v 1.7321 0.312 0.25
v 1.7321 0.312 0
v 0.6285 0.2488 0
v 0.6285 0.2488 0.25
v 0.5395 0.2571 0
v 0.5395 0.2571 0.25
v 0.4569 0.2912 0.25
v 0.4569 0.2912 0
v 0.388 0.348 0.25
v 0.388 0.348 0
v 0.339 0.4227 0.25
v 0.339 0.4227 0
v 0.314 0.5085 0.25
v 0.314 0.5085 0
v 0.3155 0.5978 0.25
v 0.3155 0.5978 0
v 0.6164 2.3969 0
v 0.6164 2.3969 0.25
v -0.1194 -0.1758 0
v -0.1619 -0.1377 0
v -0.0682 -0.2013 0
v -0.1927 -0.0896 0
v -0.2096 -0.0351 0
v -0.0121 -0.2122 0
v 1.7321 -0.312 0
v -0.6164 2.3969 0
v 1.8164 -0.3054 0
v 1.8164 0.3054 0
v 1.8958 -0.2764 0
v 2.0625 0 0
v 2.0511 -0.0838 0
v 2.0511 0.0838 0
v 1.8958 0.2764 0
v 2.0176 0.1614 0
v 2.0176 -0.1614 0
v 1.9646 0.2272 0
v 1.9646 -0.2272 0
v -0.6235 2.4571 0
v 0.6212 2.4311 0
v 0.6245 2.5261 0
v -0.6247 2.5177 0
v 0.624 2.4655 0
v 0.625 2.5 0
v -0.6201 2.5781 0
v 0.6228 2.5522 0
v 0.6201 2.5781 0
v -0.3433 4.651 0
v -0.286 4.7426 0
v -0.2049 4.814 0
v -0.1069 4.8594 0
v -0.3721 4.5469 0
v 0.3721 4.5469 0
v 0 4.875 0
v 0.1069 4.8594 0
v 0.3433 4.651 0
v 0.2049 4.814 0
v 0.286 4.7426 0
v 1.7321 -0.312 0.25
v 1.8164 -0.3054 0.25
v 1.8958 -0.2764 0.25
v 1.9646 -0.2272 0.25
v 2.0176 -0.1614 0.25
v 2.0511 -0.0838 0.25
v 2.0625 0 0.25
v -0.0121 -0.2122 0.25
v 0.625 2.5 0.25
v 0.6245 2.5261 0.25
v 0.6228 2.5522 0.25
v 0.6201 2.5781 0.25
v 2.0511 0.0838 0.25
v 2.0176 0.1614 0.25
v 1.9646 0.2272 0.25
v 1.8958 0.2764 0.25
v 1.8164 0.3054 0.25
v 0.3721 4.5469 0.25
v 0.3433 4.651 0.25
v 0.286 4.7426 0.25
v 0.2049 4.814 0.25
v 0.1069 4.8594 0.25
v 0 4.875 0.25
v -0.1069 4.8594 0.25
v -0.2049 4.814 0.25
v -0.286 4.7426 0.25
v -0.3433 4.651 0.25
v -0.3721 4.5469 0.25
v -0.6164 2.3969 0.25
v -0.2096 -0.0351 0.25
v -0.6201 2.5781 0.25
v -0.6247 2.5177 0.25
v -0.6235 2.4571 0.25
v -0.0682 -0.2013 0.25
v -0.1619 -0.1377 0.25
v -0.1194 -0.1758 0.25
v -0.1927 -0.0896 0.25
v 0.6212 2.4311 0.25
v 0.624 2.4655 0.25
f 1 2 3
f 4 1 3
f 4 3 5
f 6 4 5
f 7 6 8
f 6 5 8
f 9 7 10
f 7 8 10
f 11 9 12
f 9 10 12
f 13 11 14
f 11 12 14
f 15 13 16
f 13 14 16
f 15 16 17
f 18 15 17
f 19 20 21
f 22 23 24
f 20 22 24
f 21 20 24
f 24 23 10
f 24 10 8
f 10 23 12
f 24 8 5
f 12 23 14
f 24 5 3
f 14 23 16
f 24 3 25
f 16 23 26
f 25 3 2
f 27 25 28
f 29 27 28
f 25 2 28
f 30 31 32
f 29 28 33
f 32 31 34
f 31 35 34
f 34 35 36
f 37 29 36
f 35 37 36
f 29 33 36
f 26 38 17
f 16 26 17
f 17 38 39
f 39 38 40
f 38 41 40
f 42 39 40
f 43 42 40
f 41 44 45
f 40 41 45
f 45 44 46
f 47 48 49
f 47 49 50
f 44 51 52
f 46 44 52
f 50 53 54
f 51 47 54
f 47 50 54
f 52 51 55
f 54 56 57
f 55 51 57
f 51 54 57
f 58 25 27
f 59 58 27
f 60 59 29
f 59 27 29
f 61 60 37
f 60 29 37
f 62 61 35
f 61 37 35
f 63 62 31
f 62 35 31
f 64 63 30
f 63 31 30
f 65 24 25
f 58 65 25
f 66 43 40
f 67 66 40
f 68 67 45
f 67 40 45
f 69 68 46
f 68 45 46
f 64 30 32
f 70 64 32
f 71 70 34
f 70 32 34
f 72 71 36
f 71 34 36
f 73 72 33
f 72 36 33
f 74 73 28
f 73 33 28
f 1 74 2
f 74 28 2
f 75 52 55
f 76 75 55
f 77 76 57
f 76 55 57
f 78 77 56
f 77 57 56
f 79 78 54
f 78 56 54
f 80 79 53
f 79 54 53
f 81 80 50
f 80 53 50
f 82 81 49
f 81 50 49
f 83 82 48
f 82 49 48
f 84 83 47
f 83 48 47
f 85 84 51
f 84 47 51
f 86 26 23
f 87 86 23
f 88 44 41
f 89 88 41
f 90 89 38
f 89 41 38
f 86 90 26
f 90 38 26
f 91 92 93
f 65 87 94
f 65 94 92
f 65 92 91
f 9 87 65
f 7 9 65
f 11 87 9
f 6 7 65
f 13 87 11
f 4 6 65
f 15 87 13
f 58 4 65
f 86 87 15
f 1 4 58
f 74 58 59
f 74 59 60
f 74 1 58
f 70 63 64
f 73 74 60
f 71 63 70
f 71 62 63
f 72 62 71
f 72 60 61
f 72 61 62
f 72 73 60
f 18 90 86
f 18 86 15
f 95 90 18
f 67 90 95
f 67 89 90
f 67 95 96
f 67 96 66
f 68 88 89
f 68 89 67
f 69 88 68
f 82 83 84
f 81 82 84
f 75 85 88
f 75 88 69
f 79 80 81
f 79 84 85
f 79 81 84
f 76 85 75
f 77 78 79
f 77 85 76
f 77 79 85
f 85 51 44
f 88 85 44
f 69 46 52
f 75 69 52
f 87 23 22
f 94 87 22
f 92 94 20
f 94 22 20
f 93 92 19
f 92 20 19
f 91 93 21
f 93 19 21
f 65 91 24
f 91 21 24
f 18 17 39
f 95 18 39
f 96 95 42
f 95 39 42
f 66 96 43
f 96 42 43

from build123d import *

# Parameters (mm, degrees)
F1_DEPTH = 0.25


with BuildPart() as f1:
    # F0 (on Top) → F1 (new body)
    with BuildSketch(Plane.XY):
        with BuildLine():
            ThreePointArc((0.372059, 4.546875), (0, 4.875), (-0.372059, 4.546875))
            ThreePointArc((-0.372059, 4.546875), (-0.023484, 4.125736), (0.375, 4.5))
            ThreePointArc((0.375, 4.5), (0.374264, 4.523484), (0.372059, 4.546875))
        make_face()
        with BuildLine():
            Line((-0.372059, 4.546875), (-0.620098, 2.578125))
            ThreePointArc((-0.620098, 2.578125), (0, 3.125), (0.620098, 2.578125))
            Line((0.620098, 2.578125), (0.372059, 4.546875))
            ThreePointArc((0.372059, 4.546875), (0.374264, 4.523484), (0.375, 4.5))
            ThreePointArc((0.375, 4.5), (-0.023484, 4.125736), (-0.372059, 4.546875))
        make_face()
        with BuildLine():
            ThreePointArc((-0.620098, 2.578125), (-0.624872, 2.48737), (-0.616435, 2.396882))
            ThreePointArc((-0.616435, 2.396882), (0, 1.875), (0.616435, 2.396882))
            ThreePointArc((0.616435, 2.396882), (0.622855, 2.448264), (0.625, 2.5))
            ThreePointArc((0.625, 2.5), (0.623773, 2.539139), (0.620098, 2.578125))
            ThreePointArc((0.620098, 2.578125), (0, 3.125), (-0.620098, 2.578125))
        make_face()
        with BuildLine():
            ThreePointArc((-0.209616, -0.035065), (-0.017593, 0.211799), (0.212529, 0))
            ThreePointArc((0.212529, 0), (0.145925, -0.154513), (-0.012141, -0.212182))
            Line((-0.012141, -0.212182), (1.732148, -0.31199))
            ThreePointArc((1.732148, -0.31199), (1.4375, 0), (1.732148, 0.31199))
            Line((1.732148, 0.31199), (0.628517, 0.24884))
            ThreePointArc((0.628517, 0.24884), (0.388047, 0.348043), (0.31549, 0.597847))
            Line((0.31549, 0.597847), (0.616435, 2.396882))
            ThreePointArc((0.616435, 2.396882), (0, 1.875), (-0.616435, 2.396882))
            Line((-0.616435, 2.396882), (-0.209616, -0.035065))
        make_face()
        with BuildLine():
            ThreePointArc((-0.012141, -0.212182), (0.145925, -0.154513), (0.212529, 0))
            ThreePointArc((0.212529, 0), (-0.017593, 0.211799), (-0.209616, -0.035065))
            ThreePointArc((-0.209616, -0.035065), (-0.141904, -0.158214), (-0.012141, -0.212182))
        make_face()
        with BuildLine():
            ThreePointArc((1.732148, 0.31199), (1.4375, 0), (1.732148, -0.31199))
            ThreePointArc((1.732148, -0.31199), (1.964566, -0.227195), (2.0625, 0))
            ThreePointArc((2.0625, 0), (1.964566, 0.227195), (1.732148, 0.31199))
        make_face()
    extrude(amount=F1_DEPTH)


solid = f1.part
